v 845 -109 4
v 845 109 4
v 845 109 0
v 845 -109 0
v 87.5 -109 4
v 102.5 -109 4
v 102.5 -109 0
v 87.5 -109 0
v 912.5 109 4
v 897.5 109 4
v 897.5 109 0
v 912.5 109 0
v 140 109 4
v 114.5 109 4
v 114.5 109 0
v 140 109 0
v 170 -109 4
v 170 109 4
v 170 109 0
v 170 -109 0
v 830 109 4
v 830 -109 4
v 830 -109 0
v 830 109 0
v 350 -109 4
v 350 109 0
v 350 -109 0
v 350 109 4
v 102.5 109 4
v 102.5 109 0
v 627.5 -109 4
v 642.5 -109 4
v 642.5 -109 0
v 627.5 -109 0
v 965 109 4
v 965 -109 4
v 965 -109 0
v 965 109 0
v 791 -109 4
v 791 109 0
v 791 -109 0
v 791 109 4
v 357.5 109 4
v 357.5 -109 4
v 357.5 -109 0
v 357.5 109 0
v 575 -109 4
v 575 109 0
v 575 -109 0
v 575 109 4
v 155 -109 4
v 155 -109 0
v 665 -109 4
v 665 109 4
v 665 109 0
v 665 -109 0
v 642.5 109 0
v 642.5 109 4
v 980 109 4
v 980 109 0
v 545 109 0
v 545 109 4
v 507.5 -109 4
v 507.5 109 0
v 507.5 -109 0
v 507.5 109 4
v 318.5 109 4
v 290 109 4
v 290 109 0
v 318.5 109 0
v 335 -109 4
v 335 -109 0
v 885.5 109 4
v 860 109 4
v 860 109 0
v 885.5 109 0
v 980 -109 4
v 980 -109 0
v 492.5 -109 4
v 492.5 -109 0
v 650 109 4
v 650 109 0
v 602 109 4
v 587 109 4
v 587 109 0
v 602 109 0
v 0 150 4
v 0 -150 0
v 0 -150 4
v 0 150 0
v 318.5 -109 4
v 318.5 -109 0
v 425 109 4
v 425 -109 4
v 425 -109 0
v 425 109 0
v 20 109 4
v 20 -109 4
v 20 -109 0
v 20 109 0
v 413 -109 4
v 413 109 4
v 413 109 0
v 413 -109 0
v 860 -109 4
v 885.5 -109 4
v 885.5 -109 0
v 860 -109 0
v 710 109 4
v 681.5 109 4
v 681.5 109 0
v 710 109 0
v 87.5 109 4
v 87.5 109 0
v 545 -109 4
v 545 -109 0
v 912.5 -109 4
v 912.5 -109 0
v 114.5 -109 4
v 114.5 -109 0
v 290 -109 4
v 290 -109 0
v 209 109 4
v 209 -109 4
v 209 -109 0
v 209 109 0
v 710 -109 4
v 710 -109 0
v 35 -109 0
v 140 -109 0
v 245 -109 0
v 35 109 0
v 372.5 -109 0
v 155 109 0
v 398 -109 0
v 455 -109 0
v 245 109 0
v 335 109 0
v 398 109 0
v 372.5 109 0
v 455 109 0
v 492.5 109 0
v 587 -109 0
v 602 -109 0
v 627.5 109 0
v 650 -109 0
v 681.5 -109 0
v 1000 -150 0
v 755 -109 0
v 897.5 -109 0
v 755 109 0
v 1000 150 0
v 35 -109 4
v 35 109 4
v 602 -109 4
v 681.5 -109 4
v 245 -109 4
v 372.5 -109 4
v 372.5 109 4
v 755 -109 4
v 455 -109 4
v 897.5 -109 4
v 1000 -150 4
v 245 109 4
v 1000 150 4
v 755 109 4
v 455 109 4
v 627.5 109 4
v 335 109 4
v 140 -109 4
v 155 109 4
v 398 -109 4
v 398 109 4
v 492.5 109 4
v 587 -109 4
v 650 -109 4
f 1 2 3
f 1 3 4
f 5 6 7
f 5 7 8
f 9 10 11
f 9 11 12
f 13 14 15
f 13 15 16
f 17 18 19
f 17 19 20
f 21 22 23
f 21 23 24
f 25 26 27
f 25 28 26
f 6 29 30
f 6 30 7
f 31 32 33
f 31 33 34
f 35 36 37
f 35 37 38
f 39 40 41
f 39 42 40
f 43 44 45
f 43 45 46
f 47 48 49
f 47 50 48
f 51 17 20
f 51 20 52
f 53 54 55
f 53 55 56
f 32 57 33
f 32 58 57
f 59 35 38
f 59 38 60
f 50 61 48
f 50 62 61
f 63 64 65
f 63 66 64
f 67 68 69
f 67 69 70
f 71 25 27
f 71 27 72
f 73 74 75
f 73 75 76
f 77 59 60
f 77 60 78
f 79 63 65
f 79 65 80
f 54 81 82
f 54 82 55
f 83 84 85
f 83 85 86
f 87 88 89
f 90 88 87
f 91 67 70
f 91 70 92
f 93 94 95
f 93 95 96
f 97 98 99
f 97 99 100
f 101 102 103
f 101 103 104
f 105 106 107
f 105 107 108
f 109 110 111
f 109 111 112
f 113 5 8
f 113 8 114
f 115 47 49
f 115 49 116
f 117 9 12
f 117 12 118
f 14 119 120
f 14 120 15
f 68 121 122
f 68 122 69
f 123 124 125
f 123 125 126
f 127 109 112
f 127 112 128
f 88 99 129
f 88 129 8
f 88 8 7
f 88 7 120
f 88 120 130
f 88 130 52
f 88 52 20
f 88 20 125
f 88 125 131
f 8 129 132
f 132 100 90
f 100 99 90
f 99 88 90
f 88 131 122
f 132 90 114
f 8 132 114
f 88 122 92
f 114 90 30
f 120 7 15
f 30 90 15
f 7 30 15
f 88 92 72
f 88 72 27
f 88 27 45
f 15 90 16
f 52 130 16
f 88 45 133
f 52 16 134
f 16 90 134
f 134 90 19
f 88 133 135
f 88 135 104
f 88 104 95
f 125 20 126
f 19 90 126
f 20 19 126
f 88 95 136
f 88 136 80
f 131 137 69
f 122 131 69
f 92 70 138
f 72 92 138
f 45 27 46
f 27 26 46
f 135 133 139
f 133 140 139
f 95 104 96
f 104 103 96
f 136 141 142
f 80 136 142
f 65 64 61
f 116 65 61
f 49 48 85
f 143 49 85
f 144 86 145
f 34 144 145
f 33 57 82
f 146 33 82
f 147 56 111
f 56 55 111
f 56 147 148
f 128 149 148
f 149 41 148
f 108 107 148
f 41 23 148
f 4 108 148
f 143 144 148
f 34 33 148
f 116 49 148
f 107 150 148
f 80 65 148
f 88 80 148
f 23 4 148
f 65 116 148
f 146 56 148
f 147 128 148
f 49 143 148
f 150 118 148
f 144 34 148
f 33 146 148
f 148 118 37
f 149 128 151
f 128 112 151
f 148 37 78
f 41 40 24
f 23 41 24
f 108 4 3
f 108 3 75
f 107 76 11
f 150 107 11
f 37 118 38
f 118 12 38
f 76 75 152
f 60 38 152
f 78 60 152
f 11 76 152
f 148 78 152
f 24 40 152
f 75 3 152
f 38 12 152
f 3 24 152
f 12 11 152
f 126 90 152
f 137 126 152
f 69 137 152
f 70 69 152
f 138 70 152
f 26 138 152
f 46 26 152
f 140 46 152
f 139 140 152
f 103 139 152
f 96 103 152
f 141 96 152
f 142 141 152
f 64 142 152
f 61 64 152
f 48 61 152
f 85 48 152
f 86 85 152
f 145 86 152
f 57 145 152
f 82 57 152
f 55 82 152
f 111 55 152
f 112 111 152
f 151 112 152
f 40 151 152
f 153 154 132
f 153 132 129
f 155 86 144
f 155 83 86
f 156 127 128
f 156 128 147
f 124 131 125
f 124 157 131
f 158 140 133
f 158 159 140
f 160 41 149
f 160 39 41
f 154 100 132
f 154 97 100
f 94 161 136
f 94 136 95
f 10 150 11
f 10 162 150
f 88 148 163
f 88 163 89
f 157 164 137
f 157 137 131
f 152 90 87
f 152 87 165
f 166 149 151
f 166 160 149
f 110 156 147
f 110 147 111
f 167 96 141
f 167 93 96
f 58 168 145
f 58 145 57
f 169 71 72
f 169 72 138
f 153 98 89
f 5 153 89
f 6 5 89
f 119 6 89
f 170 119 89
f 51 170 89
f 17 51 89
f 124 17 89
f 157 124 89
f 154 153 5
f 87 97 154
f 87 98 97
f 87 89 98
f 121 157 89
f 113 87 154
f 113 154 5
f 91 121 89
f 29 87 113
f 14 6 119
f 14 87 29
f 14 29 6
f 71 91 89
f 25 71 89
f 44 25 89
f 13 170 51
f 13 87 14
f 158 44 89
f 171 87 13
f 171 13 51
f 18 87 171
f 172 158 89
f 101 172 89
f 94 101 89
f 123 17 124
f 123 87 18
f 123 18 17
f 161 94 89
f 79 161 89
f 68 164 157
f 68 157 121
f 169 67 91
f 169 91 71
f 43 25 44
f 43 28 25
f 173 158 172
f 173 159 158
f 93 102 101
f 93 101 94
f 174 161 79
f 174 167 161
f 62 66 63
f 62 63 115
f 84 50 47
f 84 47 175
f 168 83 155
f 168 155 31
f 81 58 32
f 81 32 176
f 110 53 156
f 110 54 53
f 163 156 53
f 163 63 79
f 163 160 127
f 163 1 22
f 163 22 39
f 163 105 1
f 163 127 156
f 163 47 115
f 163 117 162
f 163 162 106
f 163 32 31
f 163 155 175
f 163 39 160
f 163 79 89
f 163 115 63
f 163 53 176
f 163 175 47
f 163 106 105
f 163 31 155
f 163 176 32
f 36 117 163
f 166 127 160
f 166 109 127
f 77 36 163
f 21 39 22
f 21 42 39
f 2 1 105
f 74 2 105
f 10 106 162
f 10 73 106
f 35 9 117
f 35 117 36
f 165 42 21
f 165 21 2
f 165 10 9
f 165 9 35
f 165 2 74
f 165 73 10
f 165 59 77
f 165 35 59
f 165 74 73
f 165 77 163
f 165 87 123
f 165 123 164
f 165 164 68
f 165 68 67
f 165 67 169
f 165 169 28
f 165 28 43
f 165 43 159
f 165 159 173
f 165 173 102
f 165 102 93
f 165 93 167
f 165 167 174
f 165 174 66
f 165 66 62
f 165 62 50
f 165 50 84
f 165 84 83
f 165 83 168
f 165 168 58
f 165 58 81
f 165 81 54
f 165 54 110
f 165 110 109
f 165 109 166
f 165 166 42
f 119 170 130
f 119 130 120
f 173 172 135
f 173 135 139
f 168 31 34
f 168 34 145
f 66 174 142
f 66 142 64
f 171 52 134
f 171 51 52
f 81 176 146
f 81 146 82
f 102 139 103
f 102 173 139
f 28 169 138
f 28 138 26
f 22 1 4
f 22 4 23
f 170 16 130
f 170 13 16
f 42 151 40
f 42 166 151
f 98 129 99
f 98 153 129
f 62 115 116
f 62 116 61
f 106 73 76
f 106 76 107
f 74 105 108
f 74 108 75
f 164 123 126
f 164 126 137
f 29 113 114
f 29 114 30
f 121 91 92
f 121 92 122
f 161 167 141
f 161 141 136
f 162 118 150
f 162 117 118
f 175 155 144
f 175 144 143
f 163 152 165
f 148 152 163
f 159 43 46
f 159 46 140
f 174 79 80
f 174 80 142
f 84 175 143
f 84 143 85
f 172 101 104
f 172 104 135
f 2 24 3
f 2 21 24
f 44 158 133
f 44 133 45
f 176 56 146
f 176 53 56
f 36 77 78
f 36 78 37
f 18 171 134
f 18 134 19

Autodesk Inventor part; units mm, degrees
ref_plane "YZ Plane" through (0, 0, 0) normal (1, 0, 0) x (0, 1, 0)
ref_plane "XZ Plane" through (0, 0, 0) normal (0, 1, 0) x (-1, 0, 0)
sketch "ferrite_layer_outline_sketch" plane through (0, 0, 0) normal (0, 0, 1) x (1, 0, 0)
  line L0 (0, 150) -> (1000, 150)
  line L1 (1000, 150) -> (1000, -150)
  line L2 (1000, -150) -> (0, -150)
  line L3 (0, -150) -> (0, 150)
  line L4 (-160, 0) -> (960, 0) projected
  line L5 (500, 150) -> (500, -150) construction
  line L6 (500, 366.8869) -> (500, -324.3455) construction
  line L7 (500, 150) -> (500, -150)
  point P0 (0, 0)
  point P1 (0, 0)
  point P2 (0, 0)
  point P3 (0, 0)
  point P4 (20, 0)
  dimension "d0" = 1000
  dimension "d1" = 300
extrude "Extrusion8" add sketch "ferrite_layer_outline_sketch" along normal blind 4
ref_plane "acrylic_sheet_plane" through (0, 0, 4) normal (0, 0, 1) x (1, 0, 0)
sketch "Sketch4" plane through (0, 0, 4) normal (0, 0, 1) x (1, 0, 0)
  line L0 (20, 109) -> (35, 109)
  line L1 (35, 109) -> (35, -109)
  line L2 (35, -109) -> (20, -109)
  line L3 (20, -109) -> (20, 109)
  line L4 (-12.6534, 0) -> (47.471, 0)
  line L5 (0, 150) -> (0, -150) projected
  line L6 (1000, 150) -> (0, 150) projected
  line L7 (0, -150) -> (1000, -150) projected
  point P0 (0, 0)
  point P1 (20, 0)
  point P2 (0, 0)
  point P3 (500, 150)
  point P4 (500, -150)
  dimension "d43" = 15
  dimension "d44" = 218
  dimension "d45" = 20
extrude "Extrusion9" cut sketch "Sketch4" against normal through all
pattern_linear "Rectangular Pattern 11 fer" count 11 spacing 94.5 along (1, 0, 0) of "Extrusion9"
pattern_linear "Rectangular Pattern 8 fer" count 8 spacing 135 along (1, 0, 0) of "Extrusion9"
pattern_linear "Rectangular Pattern 10 fer" count 10 spacing 105 along (1, 0, 0) of "Extrusion9"
pattern_linear "pattern_test_#_of_ferrites 15 fer" count 15 spacing 67.5 along (1, 0, 0) of "Extrusion9"
equation "\"d0\" = track_length"
equation "\"d1\" = track_width"
equation "\"d43\" = ferrite_width"
equation "\"d44\" = ferrite_length"
equation "\"d45\" = gap_distance"
equation "\"d50\" = parameter_5"
equation "\"d62\" = test_parameter_5"
equation "\"track_length\" = 1000"
equation "\"track_width\" = 300"
equation "\"gap_distance\" = 20"
equation "\"ferrite_length\" = 218"
equation "\"ferrite_width\" = 15"
equation "\"ferrite_height\" = 8"
equation "\"acrylic_sheet_8mm\" = 8"
equation "\"parameter_5\" = 94.5"
equation "\"test_parameter_5\" = 67.5"
properties part number "ferrite_layer_dex"
